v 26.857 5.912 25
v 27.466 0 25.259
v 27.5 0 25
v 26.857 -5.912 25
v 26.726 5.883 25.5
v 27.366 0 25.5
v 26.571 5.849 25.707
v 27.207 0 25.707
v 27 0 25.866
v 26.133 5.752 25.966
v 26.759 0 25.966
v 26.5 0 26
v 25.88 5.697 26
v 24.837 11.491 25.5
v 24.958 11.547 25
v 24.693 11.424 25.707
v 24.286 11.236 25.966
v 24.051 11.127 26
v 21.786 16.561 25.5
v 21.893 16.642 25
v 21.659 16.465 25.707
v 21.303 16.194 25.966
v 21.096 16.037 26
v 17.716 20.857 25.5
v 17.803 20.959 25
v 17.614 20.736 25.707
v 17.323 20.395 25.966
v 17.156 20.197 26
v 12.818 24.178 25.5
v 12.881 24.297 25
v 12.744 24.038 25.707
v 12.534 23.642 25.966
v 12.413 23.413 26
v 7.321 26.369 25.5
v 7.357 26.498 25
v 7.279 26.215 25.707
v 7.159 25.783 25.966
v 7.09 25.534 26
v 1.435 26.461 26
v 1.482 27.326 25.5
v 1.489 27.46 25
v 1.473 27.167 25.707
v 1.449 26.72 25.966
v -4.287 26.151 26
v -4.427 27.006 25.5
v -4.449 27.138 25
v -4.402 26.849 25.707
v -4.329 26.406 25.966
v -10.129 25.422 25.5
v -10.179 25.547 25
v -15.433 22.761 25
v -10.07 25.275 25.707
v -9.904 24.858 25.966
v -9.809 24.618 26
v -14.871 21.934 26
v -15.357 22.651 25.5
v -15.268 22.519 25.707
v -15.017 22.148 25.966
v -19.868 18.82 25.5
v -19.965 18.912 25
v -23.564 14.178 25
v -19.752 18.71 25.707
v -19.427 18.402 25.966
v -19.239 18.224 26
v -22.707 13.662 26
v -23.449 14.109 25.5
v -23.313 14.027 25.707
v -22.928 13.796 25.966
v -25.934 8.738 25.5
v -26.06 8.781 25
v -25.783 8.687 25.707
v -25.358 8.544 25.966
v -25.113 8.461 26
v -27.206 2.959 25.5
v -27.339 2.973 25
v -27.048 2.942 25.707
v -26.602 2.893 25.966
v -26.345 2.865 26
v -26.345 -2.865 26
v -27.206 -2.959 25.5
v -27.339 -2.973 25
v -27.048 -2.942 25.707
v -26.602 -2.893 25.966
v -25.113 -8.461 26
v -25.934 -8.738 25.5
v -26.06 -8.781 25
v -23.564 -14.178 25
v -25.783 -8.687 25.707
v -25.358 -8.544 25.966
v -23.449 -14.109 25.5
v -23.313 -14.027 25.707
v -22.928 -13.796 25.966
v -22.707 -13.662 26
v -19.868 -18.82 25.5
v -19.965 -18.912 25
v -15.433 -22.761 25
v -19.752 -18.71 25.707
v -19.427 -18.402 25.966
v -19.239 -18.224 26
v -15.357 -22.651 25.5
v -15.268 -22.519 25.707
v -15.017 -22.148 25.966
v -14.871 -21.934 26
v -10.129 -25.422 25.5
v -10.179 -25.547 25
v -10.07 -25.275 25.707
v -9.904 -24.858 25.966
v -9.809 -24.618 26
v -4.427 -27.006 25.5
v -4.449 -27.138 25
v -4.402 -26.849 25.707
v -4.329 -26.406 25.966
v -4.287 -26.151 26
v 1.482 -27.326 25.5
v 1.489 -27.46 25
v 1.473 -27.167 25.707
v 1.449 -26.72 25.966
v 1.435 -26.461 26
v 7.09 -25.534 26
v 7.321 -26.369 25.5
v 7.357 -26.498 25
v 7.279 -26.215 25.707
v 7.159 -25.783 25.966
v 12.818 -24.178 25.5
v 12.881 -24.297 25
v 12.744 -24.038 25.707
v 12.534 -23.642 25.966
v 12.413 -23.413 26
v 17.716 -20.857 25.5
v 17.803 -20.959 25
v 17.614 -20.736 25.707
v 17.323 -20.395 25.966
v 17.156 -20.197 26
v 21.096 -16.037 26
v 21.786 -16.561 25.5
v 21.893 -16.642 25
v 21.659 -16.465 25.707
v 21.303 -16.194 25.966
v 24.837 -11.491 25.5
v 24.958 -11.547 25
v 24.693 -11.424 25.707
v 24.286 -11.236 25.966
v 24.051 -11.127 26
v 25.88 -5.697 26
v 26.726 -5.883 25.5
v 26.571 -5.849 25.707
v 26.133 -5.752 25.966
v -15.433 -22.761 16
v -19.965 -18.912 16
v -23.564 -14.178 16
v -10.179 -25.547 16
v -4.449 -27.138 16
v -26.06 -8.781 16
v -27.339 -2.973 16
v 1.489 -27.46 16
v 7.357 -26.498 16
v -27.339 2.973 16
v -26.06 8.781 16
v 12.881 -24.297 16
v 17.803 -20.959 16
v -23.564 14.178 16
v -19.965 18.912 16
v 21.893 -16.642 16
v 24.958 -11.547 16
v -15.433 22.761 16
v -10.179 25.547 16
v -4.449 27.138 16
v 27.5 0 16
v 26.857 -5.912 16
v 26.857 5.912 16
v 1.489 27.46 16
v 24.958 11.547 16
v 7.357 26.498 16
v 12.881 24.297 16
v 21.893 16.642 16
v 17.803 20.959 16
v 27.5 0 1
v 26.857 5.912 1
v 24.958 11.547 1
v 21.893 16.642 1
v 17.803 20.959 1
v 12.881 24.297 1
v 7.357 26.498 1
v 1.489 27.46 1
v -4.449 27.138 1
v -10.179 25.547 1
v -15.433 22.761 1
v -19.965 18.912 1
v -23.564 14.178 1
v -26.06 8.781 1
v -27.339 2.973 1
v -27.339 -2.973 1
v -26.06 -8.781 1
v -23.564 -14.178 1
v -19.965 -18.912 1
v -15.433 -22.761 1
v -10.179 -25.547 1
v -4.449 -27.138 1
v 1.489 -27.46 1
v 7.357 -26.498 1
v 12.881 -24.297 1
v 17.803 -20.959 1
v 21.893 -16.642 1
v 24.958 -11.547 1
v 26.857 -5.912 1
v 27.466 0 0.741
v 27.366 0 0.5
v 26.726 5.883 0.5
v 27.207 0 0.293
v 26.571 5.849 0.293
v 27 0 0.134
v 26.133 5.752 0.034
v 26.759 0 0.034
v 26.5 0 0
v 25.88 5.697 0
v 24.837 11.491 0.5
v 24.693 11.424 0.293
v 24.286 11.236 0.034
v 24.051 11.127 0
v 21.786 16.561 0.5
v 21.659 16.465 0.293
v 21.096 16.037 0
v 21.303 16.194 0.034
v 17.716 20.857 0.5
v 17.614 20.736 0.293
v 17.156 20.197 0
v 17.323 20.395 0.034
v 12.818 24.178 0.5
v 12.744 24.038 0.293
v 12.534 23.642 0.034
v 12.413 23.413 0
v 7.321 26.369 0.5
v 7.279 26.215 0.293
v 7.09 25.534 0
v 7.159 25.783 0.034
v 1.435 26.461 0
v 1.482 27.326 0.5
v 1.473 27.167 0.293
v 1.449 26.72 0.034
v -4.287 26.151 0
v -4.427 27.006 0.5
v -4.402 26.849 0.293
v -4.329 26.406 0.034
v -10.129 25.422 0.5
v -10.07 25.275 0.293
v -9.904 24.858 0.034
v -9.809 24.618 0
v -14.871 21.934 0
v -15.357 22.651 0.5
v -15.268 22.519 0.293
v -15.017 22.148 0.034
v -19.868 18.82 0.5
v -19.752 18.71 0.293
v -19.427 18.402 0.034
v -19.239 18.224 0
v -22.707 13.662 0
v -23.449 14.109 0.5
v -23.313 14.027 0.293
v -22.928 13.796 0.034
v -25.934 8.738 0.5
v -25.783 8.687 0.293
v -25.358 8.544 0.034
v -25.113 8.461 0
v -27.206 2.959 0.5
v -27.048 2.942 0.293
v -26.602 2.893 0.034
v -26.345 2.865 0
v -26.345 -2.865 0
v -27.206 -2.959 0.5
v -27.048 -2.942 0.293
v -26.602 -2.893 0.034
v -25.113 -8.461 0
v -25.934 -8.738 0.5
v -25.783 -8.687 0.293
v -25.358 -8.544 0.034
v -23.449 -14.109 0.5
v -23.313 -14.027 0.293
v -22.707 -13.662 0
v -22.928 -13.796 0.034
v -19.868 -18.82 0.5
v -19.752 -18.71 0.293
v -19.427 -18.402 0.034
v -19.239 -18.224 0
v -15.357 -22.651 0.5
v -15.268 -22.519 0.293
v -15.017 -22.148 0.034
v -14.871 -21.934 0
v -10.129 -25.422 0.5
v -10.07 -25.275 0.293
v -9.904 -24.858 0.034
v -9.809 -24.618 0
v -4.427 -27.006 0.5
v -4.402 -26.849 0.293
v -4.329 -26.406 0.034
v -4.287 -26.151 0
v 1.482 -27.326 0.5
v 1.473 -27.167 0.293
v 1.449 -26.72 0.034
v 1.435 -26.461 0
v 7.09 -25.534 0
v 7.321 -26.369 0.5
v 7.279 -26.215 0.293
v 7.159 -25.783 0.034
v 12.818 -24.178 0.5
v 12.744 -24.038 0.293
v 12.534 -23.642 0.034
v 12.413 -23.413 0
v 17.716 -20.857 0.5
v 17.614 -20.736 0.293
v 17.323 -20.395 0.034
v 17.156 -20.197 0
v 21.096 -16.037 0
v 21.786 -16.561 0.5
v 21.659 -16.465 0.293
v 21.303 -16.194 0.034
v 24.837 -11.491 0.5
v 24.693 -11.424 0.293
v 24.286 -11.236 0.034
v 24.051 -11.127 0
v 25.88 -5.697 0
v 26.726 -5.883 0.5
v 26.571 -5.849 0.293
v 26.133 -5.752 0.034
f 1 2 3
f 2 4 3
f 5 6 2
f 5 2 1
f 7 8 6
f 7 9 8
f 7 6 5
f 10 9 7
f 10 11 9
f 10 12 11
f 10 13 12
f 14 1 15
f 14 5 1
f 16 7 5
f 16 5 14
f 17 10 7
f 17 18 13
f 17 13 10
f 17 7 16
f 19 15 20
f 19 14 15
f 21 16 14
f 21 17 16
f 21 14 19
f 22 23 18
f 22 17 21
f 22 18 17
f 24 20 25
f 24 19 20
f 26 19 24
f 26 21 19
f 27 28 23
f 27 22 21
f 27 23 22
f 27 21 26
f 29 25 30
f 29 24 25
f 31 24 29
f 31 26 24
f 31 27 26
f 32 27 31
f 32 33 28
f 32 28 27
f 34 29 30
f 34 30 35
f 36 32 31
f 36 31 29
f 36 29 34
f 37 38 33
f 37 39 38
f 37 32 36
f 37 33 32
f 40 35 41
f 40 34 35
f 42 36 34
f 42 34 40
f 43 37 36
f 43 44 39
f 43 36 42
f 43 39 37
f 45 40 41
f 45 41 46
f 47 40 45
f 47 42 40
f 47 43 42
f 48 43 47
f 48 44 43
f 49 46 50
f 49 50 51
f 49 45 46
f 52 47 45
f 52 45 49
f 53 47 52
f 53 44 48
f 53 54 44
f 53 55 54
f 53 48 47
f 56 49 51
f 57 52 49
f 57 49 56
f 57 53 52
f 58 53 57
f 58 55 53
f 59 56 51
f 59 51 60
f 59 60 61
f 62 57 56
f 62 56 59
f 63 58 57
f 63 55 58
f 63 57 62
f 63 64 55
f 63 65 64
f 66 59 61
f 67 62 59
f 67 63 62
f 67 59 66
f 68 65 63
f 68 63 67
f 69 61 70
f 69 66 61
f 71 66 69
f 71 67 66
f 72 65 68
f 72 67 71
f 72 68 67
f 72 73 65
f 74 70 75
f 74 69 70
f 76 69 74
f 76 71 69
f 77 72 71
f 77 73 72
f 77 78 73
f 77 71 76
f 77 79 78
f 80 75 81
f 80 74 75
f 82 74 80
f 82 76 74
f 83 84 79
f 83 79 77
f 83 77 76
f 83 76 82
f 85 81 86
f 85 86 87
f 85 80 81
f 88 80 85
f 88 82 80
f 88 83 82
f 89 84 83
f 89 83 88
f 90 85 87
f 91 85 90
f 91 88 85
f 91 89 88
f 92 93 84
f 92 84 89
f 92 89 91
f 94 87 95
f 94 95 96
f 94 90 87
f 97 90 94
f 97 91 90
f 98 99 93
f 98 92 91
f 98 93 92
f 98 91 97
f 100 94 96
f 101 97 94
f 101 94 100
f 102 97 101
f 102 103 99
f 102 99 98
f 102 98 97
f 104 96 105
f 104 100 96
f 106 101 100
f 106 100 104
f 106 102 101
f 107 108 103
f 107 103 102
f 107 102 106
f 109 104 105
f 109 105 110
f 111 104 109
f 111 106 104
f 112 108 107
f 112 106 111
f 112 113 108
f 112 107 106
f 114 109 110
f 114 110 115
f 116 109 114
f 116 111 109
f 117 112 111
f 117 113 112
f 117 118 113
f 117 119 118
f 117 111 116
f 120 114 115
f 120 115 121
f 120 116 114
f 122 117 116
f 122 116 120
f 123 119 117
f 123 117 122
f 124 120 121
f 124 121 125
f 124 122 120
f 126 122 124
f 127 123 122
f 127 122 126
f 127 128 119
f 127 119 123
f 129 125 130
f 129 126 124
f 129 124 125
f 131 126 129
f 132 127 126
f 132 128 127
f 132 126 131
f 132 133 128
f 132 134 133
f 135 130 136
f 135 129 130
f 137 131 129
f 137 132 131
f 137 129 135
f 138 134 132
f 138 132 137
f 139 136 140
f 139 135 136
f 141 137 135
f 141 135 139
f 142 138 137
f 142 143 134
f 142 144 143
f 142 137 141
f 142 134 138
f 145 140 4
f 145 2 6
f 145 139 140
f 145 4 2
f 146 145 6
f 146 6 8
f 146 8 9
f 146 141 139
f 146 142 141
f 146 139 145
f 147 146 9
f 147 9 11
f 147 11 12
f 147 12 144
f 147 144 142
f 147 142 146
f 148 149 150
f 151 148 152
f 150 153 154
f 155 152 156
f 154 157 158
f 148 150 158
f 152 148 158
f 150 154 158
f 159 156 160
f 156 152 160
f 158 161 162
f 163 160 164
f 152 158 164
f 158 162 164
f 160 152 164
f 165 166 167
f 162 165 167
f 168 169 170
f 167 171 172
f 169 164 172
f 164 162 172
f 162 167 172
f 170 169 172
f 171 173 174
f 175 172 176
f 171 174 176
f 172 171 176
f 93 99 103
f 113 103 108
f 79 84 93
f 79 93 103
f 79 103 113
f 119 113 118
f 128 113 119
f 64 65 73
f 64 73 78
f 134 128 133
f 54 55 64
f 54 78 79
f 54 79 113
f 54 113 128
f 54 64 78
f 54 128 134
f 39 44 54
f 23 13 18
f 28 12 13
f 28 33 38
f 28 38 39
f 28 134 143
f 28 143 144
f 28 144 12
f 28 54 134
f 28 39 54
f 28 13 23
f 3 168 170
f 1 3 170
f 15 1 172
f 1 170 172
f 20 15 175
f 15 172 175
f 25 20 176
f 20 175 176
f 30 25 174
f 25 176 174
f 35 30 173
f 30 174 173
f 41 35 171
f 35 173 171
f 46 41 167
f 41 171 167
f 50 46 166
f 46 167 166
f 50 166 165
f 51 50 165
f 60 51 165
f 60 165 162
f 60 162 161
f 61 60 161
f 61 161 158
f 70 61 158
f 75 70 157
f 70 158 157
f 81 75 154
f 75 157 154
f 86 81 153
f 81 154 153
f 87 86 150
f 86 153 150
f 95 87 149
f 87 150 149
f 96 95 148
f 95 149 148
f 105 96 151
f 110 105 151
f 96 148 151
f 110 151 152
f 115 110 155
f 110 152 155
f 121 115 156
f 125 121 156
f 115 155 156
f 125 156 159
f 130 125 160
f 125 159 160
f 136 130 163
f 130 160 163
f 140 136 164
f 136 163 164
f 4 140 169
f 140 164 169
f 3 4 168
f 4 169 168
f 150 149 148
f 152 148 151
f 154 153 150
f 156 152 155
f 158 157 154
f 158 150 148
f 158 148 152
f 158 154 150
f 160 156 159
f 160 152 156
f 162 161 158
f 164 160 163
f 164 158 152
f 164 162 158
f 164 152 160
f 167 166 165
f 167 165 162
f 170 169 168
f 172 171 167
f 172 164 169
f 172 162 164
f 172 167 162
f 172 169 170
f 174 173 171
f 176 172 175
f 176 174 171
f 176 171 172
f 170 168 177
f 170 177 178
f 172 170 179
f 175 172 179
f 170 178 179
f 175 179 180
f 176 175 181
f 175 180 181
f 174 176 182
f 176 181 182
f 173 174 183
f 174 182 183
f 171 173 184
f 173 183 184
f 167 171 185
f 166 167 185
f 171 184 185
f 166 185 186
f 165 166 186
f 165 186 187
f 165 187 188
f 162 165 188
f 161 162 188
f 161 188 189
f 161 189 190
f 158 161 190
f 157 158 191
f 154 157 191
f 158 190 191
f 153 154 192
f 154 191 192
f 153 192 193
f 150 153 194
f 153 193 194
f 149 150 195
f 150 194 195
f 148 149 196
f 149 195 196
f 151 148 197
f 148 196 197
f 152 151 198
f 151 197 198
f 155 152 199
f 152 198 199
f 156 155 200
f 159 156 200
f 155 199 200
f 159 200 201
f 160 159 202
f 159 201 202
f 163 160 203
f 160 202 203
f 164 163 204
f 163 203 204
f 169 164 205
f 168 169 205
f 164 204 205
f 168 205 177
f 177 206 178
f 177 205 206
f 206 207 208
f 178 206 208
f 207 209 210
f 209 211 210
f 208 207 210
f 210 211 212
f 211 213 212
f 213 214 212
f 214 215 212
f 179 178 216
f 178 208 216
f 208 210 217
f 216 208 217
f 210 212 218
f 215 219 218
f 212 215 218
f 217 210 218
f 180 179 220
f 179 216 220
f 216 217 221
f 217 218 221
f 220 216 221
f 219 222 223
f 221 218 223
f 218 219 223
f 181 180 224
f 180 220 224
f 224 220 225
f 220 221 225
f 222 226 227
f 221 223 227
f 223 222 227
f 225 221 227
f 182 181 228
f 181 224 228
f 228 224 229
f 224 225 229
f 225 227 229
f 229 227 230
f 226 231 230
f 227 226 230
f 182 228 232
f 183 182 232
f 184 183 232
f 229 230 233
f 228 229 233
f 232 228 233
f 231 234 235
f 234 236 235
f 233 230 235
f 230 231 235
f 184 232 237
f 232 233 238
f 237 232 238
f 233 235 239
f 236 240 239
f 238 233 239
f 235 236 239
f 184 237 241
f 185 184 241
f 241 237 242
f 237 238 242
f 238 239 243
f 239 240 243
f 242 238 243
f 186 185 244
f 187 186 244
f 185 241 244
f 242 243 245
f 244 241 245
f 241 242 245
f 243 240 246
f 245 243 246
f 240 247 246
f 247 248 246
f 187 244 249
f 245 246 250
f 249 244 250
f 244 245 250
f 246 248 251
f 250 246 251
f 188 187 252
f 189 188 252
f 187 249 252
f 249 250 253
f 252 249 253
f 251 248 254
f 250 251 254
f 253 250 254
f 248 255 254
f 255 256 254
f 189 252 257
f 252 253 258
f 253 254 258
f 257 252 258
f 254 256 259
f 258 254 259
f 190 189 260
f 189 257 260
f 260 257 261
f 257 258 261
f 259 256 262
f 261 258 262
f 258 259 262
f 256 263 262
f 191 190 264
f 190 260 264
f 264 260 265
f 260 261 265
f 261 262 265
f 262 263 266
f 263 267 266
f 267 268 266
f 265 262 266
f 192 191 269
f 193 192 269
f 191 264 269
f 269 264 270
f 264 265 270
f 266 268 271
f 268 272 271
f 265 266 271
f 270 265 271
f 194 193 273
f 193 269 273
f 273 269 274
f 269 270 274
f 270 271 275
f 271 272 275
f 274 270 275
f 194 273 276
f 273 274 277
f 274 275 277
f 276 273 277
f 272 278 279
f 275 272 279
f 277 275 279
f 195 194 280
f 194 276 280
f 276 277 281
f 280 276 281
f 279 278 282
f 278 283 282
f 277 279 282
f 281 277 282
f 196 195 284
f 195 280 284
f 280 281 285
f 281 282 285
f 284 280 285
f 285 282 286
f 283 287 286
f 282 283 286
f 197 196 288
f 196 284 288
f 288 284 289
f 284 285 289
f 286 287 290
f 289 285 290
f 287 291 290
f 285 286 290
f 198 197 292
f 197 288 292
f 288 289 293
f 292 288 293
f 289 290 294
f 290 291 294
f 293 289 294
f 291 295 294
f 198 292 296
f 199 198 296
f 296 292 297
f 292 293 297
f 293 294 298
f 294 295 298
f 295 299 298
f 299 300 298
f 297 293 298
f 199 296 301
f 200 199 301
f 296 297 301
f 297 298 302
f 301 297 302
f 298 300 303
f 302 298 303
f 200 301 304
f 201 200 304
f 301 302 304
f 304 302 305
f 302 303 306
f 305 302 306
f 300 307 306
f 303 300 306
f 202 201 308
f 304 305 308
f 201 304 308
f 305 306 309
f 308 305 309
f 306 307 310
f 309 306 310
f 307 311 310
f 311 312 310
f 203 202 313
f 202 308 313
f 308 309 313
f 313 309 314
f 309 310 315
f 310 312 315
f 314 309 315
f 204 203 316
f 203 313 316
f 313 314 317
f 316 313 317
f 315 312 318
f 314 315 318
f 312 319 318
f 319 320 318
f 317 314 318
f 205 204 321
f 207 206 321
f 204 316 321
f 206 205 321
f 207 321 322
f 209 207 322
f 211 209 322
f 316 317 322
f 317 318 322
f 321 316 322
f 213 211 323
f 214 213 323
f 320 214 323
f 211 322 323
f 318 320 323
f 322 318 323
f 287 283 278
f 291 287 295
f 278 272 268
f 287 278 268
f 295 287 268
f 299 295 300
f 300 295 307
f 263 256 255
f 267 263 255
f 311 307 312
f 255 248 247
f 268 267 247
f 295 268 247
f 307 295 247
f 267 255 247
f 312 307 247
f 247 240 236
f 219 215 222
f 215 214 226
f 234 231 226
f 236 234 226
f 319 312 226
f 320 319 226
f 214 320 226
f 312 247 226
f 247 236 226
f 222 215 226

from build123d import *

# Parameters (mm, degrees)
F0_R     = 27.5
F1_DEPTH = 16
F2_R     = 27.5
F3_DEPTH = 10
F4_R     = 1
F5_R     = 1


with BuildPart() as f1:
    # F0 (on Top) → F1 (new body)
    with BuildSketch(Plane.XY):
        Circle(F0_R)
    extrude(amount=F1_DEPTH)

    # F5
    f5_edges = [f1.edges().sort_by_distance(p)[0] for p in [
        (-27.5, 0, 0),
    ]]
    fillet(f5_edges, radius=F5_R)


with BuildPart() as f3:
    # F2 (on face) → F3 (new body)
    with BuildSketch(Plane.XY.offset(16)):
        Circle(F2_R)
    extrude(amount=F3_DEPTH)

    # F4
    f4_edges = [f3.edges().sort_by_distance(p)[0] for p in [
        (-27.5, 0, 26),
    ]]
    fillet(f4_edges, radius=F4_R)


solid = Compound([f1.part, f3.part])
